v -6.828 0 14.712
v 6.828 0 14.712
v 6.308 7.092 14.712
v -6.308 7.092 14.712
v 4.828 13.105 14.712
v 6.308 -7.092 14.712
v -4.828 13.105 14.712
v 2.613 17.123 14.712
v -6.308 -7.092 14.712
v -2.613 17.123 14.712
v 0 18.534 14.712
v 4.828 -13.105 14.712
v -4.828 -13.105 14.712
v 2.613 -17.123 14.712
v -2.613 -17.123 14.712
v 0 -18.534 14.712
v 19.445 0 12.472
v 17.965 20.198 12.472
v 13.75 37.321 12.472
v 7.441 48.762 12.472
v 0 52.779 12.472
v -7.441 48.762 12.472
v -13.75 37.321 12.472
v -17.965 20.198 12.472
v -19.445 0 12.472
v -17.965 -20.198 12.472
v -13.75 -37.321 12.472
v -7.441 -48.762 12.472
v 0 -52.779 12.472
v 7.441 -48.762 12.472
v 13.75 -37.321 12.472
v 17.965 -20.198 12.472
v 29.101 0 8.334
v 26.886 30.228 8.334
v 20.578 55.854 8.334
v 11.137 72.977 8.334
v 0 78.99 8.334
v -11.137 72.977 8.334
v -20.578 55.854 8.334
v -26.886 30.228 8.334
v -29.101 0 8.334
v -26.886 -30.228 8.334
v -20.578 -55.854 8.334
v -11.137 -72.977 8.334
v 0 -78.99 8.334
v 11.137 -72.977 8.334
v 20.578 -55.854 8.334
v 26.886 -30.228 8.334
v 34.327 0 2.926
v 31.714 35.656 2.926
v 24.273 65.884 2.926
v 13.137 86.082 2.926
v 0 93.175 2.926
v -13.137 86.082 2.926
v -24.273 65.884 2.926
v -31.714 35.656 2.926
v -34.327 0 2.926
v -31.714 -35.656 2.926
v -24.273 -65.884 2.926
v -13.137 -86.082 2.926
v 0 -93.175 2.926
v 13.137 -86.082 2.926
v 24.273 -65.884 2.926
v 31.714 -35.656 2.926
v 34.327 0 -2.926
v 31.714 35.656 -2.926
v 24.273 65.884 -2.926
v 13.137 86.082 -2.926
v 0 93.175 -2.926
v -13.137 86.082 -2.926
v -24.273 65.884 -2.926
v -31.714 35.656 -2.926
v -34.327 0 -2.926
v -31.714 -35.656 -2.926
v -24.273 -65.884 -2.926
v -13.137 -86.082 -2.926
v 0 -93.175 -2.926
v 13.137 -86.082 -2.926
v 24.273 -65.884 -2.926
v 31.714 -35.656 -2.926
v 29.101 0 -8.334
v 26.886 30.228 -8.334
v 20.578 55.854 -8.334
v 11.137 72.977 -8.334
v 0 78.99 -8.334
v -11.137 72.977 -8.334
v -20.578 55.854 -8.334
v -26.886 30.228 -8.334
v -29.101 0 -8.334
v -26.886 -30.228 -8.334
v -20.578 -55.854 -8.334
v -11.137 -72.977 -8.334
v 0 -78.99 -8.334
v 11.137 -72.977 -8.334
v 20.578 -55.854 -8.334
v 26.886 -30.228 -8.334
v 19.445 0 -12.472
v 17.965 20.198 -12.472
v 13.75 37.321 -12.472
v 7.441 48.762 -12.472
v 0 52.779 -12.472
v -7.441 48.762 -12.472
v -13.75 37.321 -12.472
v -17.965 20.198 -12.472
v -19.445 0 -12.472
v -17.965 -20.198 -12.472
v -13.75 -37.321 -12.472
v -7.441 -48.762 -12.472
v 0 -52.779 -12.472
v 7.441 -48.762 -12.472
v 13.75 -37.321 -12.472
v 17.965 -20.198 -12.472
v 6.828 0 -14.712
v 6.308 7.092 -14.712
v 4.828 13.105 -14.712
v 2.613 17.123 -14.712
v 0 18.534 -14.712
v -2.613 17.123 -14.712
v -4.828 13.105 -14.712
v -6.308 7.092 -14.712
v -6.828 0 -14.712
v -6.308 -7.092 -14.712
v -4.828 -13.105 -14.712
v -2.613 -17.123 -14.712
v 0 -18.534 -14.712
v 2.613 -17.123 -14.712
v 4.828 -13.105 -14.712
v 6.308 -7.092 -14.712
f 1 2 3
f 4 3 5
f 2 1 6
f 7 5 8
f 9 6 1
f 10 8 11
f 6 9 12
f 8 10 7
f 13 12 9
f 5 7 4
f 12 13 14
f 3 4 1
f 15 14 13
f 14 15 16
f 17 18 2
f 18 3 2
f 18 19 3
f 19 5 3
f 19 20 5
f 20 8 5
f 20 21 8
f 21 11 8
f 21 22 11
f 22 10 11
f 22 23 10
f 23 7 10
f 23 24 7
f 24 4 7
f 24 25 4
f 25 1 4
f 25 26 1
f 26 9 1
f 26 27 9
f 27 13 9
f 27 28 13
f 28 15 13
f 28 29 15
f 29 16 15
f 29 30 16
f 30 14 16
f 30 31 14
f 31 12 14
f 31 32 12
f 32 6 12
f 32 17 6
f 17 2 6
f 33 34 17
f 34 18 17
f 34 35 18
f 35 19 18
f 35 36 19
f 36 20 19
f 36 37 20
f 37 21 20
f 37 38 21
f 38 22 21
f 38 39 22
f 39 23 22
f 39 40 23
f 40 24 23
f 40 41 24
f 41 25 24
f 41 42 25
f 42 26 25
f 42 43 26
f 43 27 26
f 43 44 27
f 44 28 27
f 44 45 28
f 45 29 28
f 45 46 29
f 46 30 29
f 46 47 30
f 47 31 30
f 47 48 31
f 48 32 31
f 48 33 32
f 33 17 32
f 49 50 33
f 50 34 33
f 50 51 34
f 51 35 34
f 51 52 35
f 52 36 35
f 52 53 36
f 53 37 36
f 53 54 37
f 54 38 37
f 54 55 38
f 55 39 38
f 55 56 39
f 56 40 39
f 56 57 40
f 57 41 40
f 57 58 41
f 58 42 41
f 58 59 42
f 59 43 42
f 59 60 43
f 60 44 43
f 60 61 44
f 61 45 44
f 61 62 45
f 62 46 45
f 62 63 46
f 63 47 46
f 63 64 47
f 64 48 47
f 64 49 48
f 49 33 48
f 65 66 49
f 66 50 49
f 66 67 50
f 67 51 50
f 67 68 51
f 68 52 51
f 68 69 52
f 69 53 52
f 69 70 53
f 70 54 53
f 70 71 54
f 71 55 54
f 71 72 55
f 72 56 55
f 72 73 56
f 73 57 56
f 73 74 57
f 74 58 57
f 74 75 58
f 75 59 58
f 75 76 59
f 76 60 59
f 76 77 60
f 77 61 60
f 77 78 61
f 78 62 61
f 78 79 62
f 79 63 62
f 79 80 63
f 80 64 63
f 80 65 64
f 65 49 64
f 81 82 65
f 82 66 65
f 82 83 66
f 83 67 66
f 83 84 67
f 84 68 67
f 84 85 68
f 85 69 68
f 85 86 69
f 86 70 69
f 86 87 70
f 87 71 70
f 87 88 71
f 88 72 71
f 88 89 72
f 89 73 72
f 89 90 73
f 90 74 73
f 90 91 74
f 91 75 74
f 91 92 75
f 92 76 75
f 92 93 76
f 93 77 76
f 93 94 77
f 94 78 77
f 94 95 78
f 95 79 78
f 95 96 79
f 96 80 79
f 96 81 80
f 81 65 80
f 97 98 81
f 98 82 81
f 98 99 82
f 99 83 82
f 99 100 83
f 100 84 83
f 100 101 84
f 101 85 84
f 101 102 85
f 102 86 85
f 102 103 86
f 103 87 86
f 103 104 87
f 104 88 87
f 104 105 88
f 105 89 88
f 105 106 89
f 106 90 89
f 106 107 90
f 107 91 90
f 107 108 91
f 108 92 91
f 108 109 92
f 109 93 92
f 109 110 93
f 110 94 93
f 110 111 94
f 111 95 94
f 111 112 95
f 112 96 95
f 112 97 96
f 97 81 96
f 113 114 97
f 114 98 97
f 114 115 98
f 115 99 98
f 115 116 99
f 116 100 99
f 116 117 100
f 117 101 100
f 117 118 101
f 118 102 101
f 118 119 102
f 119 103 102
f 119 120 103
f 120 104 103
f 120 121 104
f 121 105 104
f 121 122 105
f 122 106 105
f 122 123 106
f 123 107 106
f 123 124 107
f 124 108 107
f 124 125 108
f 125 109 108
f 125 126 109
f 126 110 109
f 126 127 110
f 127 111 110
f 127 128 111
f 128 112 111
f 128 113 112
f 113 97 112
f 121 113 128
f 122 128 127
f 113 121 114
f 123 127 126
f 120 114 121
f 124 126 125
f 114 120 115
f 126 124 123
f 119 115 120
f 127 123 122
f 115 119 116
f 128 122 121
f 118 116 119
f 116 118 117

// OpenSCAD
// Generated by SolidPython 1.0.1 on 2020-07-29 00:46:48


scale(v = [7, 19, 3]) {
	sphere(r = 5);
}
/***********************************************
*********      SolidPython code:      **********
************************************************
 
# import packages: SolidPython
from solid import *
from solid.utils import *
from itertools import chain, combinations, permutations


class Resize:

    def __init__(self, scad_file):
        self.scad_file = scad_file
        #self.scad_file = import_scad(scad_file)
        # cone/cylinder param:
        self.r1 = 0
        self.r2 = 0
        self.h = 0
        # rectangular prism param:
        self.w = 0
        self.l = 0
        # ellipse param:
        self.r = 0

    # import OpenScad code (file name corresponds to shape)


    # classify shape + parameters
    def assign(self, param1, param2, param3):
        if self.scad_file == 'cone.scad':
            self.r1 = param1
            self.r2 = param2
            self.h = param3
        elif self.scad_file == 'cylinder.scad':
            self.r1 = param1
            self.r2 = param2
            self.h = param3
        elif self.scad_file == 'rectangularPrism.scad':
            self.h = param1
            self.l = param2
            self.w = param3
        else:
            self.r = param1
            self.h = param2

    # resize parameters
    def iterate(self):
        x = range(3, 20, 2)
        i = 1
        if self.scad_file == 'cone.scad':
            tempList = list(permutations(x, 2))
            for temp in tempList:
                param1 = temp[0]
                param2 = temp[1]
                filepath = 'produced_scad_files/' + 'cone' + str(param1) + '_' + str(param2) + '_' + '.scad'
                scad_render_to_file(cylinder(h=param1, r1=param2, r2=0), filepath)

        elif self.scad_file == 'cylinder.scad':
            tempList = list(permutations(x, 3))
            for temp in tempList:
                param1 = temp[0]
                param2 = temp[1]
                filepath = 'produced_scad_files/' + 'cylinder' + str(param1) + '_' + str(param2) + '_' + '.scad'
                scad_render_to_file(cylinder(h=param1, r1=param2, r2=param2), filepath)

        elif self.scad_file == 'rectangularPrism.scad':
            tempList = list(permutations(x, 3))
            for temp in tempList:
                param1 = temp[0]
                param2 = temp[1]
                param3 = temp[2]
                filepath = 'produced_scad_files/' + 'rectangularPrism' + str(param1) + '_' + str(param2) + '_' + str(
                    param3) + '.scad'
                scad_render_to_file(cube(size=(param1, param2, param3)), filepath)

        elif self.scad_file == 'ellipse.scad':
            tempList = list(permutations(x, 4))
            for temp in tempList:
                param1 = temp[0]
                param2 = temp[1]
                param3 = temp[2]
                param4 = temp[3]
                filepath = 'produced_scad_files/' + 'ellipse' + str(param1) + '_' + str(param2) + '_' + str(param3) + '_' + str(param4) + '.scad'
                scad_render_to_file(scale([param1, param2, param3])(sphere(r=param4)), filepath)

    def render_to_scadfile(self):
        scad_render_to_file(scad, 'example.scad') 
 
************************************************/
